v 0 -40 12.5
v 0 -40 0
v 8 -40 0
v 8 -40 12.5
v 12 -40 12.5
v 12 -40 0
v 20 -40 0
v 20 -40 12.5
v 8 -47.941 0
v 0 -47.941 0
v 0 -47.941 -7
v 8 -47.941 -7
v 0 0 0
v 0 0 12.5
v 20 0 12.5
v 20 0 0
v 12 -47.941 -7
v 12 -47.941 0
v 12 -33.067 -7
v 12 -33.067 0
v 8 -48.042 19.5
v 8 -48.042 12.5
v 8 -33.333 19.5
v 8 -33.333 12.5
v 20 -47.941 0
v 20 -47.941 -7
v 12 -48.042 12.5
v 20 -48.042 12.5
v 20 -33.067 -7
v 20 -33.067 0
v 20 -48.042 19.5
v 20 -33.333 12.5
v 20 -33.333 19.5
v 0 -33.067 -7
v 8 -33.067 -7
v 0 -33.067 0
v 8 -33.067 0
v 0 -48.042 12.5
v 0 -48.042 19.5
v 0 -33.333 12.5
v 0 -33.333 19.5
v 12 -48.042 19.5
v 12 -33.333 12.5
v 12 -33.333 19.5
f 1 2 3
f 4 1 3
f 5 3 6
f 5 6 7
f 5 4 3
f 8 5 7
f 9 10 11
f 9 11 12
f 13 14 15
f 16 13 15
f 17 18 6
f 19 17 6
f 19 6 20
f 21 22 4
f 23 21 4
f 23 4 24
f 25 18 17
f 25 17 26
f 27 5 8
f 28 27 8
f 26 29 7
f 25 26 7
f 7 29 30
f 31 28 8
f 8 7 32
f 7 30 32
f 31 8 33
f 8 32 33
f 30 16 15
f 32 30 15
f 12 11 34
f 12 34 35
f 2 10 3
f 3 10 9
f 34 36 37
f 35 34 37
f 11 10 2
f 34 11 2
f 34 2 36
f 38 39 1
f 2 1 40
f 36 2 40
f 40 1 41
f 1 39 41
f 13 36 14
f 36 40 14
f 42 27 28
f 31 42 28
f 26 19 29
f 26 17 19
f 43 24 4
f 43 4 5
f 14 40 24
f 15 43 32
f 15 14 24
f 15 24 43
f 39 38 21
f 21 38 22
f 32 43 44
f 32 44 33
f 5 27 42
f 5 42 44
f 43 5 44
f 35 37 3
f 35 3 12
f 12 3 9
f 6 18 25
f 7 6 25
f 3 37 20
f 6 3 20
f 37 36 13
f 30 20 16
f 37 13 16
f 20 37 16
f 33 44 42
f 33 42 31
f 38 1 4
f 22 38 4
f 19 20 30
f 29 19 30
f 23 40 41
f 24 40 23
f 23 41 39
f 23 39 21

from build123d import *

# Parameters (mm, degrees)
F0_W     = 20
F0_H     = 12.5
F1_DEPTH = 40
F2_W     = 8
F2_H     = 14.7096791708
F3_DEPTH = 7
F4_W     = 8
F4_H     = 7.9405596852
F4_H_2   = 6.9329673052
F5_DEPTH = 7


with BuildPart() as f1:
    # F0 (on Front) → F1 (new body)
    with BuildSketch(Plane.XZ):
        with Locations((10, 6.25)):
            Rectangle(F0_W, F0_H)
    extrude(amount=F1_DEPTH)

    # F2 (on face) → F3 (join)
    with BuildSketch(Plane.XY.offset(12.5)):
        with Locations((4, -40.6874705773)):
            Rectangle(F2_W, F2_H)
        with Locations((16, -40.6874705773)):
            Rectangle(F2_W, F2_H)
    extrude(amount=F3_DEPTH)

    # F4 (on face) → F5 (join)
    with BuildSketch(Plane(origin=(0, 0, 0), x_dir=(1, 0, 0), z_dir=(0, 0, -1))):
        with Locations((4, 43.9702798426)):
            Rectangle(F4_W, F4_H)
        with Locations((4, 36.5335163474)):
            Rectangle(F4_W, F4_H_2)
        with Locations((16, 36.5335163474)):
            Rectangle(F4_W, F4_H_2)
        with Locations((16, 43.9702798426)):
            Rectangle(F4_W, F4_H)
    extrude(amount=F5_DEPTH)


solid = f1.part
